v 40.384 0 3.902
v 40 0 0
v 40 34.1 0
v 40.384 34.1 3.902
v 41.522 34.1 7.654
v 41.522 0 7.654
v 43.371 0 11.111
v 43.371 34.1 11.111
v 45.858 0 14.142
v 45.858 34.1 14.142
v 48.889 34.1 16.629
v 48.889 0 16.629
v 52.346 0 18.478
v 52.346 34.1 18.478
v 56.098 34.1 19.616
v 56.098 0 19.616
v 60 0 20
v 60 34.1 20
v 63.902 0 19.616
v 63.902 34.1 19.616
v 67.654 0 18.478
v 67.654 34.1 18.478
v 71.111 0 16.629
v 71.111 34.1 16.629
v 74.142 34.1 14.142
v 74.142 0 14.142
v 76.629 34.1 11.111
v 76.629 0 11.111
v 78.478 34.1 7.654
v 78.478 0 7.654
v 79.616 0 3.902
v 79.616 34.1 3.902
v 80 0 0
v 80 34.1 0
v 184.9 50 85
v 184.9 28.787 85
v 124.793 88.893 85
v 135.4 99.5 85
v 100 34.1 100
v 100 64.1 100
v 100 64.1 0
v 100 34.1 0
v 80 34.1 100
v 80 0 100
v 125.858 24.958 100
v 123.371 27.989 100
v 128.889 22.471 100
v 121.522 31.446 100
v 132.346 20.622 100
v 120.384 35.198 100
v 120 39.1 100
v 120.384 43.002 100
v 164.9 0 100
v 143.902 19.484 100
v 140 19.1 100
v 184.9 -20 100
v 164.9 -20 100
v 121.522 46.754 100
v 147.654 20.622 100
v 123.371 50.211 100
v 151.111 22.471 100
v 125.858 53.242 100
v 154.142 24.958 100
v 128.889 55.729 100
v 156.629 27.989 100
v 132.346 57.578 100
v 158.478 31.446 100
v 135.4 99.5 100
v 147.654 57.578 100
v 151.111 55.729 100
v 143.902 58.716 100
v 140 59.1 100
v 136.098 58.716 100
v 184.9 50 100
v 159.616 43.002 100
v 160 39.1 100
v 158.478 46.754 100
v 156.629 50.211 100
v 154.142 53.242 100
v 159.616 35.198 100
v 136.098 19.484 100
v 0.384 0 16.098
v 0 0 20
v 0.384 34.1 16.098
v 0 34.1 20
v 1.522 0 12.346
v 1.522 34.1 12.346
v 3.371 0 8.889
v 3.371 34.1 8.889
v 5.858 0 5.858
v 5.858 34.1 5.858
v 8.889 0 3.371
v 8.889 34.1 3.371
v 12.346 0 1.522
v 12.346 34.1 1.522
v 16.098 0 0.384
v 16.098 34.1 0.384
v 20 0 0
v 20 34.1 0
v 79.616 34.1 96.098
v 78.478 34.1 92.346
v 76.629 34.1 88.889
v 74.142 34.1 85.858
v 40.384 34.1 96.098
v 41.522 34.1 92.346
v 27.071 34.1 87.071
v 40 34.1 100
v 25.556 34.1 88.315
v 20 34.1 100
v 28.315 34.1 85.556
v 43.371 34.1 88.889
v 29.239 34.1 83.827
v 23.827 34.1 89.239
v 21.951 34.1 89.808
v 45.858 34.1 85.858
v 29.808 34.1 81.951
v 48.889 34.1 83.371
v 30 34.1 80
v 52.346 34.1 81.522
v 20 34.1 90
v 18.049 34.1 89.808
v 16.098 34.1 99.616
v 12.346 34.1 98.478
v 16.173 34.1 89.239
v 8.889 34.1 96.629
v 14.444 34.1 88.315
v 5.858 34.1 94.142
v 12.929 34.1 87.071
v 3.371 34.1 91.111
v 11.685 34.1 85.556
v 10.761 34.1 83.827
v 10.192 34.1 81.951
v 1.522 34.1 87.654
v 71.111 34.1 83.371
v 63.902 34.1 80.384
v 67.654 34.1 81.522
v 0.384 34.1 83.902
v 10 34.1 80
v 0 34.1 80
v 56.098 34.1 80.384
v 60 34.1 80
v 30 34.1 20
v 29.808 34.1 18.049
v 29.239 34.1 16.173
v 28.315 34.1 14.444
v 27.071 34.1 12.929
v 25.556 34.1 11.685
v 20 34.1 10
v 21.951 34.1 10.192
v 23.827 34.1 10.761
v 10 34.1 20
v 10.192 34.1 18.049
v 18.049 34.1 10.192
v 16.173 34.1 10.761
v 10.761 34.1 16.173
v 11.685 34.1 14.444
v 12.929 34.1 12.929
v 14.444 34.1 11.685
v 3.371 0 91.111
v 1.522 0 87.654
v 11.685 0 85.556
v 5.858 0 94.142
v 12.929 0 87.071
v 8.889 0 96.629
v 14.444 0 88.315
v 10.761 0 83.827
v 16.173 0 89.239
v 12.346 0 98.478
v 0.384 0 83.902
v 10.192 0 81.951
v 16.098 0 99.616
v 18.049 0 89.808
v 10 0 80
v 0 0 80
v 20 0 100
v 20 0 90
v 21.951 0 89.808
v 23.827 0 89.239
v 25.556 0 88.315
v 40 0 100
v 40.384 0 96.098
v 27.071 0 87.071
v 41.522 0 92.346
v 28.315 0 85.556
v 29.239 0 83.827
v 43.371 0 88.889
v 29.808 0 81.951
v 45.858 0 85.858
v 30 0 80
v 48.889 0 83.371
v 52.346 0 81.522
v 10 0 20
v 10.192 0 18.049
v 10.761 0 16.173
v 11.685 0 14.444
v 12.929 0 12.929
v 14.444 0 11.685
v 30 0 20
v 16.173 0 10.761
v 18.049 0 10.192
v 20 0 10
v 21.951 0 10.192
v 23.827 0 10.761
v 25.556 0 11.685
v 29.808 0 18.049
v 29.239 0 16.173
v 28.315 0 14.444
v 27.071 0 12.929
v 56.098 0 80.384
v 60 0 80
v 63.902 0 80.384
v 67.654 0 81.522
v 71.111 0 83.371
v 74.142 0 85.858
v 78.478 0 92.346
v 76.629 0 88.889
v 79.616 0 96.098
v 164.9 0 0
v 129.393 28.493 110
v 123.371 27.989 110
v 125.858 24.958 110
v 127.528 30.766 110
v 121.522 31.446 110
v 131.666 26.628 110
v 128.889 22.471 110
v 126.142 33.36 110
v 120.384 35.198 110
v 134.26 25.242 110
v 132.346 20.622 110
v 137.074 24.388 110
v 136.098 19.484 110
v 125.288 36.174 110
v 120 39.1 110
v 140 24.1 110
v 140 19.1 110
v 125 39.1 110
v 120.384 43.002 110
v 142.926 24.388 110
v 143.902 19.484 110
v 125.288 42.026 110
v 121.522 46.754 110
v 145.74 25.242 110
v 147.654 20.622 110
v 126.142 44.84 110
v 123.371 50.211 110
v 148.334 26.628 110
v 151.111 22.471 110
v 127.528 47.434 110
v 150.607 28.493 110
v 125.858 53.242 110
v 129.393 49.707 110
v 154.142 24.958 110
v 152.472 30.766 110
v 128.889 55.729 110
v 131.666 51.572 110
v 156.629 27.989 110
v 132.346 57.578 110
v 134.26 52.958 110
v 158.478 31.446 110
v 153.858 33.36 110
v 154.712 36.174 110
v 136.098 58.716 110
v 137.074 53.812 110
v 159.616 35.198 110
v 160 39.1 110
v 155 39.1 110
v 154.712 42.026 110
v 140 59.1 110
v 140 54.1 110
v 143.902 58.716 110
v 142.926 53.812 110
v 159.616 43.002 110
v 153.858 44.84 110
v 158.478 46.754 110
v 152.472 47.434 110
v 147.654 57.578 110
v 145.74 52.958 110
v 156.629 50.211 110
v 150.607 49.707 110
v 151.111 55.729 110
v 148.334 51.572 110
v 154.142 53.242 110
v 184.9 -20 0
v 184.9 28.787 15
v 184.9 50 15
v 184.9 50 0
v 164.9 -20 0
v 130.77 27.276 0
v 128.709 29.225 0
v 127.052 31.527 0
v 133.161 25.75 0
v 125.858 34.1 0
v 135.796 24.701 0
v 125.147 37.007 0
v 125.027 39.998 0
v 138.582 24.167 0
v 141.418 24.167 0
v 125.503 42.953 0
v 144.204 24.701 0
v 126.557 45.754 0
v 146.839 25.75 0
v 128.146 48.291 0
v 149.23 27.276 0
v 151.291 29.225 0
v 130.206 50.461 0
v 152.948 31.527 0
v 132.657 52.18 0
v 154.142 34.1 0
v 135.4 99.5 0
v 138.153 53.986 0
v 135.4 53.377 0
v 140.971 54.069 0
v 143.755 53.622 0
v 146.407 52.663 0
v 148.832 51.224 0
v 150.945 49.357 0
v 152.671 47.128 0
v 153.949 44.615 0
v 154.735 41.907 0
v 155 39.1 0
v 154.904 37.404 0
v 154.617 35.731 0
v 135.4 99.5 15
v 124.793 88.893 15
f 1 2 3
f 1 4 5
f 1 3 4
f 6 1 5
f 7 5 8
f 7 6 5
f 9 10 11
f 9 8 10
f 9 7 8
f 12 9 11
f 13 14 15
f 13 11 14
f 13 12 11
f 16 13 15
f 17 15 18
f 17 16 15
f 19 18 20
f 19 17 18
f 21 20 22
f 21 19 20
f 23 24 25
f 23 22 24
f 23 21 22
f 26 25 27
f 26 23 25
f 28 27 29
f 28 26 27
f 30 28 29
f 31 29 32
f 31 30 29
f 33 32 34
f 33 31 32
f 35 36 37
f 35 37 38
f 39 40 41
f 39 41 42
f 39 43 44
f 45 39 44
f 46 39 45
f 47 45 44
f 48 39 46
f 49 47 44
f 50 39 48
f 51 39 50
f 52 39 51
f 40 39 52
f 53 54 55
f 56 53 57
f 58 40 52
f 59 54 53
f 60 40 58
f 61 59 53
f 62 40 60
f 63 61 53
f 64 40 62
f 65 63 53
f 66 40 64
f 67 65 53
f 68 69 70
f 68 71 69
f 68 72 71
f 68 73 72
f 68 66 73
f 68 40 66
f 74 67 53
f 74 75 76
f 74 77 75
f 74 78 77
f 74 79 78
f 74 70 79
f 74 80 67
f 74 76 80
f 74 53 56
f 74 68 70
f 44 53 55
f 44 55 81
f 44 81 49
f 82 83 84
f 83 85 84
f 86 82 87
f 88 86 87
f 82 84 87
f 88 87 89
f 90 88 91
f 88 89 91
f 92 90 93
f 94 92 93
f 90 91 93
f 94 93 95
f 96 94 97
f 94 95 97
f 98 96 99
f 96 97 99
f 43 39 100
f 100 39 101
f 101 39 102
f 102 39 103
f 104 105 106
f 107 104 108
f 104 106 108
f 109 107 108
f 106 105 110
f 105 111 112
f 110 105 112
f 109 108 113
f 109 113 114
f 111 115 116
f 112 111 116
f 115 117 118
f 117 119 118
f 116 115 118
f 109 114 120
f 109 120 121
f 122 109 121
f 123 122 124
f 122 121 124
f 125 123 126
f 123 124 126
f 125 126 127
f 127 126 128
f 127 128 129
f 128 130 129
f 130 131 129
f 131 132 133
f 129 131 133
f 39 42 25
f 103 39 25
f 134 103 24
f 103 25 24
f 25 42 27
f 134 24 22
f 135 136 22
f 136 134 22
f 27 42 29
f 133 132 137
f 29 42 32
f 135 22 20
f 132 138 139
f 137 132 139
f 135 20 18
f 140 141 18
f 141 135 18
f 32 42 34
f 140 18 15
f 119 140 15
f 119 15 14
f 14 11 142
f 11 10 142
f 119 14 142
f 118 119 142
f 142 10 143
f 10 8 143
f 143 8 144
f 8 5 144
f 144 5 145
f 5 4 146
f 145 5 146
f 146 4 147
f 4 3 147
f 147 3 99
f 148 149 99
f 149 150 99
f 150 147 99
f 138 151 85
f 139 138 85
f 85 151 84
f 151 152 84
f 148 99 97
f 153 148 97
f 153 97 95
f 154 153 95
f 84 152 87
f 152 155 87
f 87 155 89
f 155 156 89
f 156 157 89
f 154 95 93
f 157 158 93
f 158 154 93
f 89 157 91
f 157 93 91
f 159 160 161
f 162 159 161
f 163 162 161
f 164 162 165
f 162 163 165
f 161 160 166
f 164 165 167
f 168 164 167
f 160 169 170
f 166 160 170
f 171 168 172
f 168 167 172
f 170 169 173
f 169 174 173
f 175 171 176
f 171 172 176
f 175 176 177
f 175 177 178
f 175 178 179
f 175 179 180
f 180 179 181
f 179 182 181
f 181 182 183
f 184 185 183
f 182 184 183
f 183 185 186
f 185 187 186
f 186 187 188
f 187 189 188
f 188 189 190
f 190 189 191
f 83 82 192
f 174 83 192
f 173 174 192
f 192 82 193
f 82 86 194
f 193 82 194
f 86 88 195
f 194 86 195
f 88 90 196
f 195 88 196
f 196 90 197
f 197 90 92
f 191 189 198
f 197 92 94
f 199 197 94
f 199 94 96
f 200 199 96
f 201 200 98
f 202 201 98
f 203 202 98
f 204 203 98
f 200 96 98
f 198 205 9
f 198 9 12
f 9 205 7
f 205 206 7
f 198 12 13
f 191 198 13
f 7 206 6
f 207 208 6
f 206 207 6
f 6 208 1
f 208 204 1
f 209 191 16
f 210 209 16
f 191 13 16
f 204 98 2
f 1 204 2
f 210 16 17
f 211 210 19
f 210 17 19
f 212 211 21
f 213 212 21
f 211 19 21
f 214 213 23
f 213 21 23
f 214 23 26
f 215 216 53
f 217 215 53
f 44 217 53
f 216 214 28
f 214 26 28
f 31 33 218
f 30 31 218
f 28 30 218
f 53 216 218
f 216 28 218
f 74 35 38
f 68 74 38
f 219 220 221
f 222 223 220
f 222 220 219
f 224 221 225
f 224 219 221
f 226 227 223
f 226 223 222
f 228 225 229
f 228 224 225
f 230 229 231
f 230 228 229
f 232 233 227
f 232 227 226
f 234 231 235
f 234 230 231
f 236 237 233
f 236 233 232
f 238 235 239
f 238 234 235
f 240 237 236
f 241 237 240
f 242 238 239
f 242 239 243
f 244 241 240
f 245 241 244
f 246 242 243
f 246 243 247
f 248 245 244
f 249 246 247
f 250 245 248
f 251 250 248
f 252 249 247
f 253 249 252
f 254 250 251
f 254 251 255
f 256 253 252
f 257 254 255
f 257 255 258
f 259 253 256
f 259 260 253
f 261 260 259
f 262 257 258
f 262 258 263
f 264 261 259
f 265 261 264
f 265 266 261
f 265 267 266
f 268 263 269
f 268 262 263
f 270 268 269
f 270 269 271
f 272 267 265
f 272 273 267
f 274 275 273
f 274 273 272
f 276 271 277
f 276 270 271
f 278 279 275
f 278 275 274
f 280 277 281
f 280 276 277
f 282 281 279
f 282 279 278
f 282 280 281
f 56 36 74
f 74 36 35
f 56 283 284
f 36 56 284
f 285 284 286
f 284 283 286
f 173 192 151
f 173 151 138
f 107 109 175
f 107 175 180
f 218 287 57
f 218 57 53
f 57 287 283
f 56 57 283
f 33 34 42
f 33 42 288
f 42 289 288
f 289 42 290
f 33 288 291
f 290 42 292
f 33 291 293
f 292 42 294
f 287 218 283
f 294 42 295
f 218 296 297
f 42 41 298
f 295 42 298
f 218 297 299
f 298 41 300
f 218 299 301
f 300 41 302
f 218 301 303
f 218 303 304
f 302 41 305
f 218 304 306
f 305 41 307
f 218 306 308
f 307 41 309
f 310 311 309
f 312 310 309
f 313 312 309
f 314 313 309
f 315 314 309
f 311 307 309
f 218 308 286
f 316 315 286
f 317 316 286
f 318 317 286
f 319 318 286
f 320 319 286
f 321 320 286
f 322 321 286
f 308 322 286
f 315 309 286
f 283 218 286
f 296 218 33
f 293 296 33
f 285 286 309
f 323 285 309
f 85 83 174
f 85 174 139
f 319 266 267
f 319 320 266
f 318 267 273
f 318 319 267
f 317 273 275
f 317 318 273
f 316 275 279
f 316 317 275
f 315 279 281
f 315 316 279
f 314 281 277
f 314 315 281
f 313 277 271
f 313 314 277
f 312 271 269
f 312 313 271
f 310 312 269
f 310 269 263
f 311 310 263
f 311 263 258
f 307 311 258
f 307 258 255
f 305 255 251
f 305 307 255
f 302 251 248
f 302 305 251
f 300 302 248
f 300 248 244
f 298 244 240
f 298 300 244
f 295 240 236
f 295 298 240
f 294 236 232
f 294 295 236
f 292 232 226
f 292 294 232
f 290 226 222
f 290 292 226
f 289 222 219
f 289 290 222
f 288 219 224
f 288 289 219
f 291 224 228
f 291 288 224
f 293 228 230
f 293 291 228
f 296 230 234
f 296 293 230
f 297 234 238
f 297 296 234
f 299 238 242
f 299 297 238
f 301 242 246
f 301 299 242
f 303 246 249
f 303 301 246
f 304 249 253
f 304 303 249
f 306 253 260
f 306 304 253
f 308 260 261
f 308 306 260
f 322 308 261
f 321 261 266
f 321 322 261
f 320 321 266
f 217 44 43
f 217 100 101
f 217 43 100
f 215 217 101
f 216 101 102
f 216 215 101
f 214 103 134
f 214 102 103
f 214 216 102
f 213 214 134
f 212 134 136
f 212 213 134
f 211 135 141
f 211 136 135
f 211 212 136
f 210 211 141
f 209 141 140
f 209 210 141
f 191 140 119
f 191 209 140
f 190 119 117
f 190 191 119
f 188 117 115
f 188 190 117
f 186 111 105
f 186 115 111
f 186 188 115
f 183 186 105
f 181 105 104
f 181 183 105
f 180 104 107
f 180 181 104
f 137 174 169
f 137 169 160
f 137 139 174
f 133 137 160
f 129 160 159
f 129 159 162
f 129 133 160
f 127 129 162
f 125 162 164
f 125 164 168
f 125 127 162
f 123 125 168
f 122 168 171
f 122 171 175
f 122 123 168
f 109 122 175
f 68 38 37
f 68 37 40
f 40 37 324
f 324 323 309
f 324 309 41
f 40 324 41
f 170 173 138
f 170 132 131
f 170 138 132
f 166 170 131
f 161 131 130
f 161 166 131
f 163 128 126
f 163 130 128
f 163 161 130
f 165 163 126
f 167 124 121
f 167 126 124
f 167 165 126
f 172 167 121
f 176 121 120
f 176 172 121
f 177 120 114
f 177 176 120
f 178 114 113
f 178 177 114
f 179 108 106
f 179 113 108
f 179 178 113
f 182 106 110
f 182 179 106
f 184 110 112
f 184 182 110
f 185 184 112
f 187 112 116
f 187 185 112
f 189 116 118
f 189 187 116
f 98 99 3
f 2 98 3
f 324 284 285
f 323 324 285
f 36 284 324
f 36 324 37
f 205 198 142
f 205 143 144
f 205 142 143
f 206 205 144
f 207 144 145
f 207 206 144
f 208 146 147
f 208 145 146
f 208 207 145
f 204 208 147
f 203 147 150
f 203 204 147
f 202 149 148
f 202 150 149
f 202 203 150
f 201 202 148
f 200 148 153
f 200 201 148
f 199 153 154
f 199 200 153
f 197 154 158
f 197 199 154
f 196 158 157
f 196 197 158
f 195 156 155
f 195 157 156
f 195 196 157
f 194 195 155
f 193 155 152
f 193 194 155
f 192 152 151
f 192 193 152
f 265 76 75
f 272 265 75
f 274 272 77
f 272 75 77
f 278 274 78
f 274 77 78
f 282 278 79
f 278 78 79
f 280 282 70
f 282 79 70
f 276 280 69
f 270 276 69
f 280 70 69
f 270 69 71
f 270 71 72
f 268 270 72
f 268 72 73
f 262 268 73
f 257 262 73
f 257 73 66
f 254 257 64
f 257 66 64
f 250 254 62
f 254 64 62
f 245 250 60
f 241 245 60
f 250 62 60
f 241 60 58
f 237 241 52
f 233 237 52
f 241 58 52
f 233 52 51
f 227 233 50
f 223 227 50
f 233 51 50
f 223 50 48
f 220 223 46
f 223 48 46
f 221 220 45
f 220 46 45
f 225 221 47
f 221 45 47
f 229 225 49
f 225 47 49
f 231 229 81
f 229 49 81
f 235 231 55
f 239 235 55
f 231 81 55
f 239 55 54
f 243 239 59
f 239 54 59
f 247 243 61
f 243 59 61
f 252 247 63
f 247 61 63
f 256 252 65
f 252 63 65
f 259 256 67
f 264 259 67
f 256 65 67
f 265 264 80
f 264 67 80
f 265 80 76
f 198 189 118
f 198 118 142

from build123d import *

# Parameters (mm, degrees)
SKETCH_1_W               = 100
SKETCH_1_H               = 34.1
SKETCH_1_W_2             = 20
SKETCH_1_H_2             = 20
EXTRUDE_1_DEPTH          = 100
CUT_EXTRUDE_1_DEPTH      = 228.303332576
CUT_EXTRUDE_1_DEPTH_BACK = 228.303332576
SKETCH_2_W               = 70
SKETCH_2_H               = 15
CUT_EXTRUDE_2_DEPTH      = 221.148063812
CUT_EXTRUDE_2_DEPTH_BACK = 221.148063812
SKETCH_3_R               = 20
CUT_EXTRUDE_3_DEPTH      = 221.148063812
CUT_EXTRUDE_3_DEPTH_BACK = 221.148063812
SKETCH_4_R               = 10
FILLET_3_R               = 20
SKETCH_5_R               = 20
EXTRUDE_2_DEPTH          = 10
CUT_EXTRUDE_4_DEPTH      = 238.040629429
CUT_EXTRUDE_4_DEPTH_BACK = 238.040629429
SKETCH_6_R               = 15


with BuildPart() as part:
    # Эскиз1 → Бобышка-Вытянуть1 (new body)
    with BuildSketch(Plane.XY):
        with Locations((50, 17.05)):
            Rectangle(SKETCH_1_W, SKETCH_1_H)
        with BuildLine():
            Line((100, 34.1), (100, 0))
            Line((100, 0), (164.9, 0))
            Line((164.9, 0), (184.9, 0))
            Line((184.9, 0), (184.9, 34.1))
            Line((184.9, 34.1), (154.142135624, 34.1))
            ThreePointArc((154.142135624, 34.1), (140, 24.1), (125.857864376, 34.1))
            Line((125.857864376, 34.1), (100, 34.1))
        make_face()
        with BuildLine():
            Line((184.9, 50), (135.4, 99.5))
            Line((135.4, 99.5), (135.4, 53.377254638))
            ThreePointArc((135.4, 53.377254638), (148.831760866, 51.224355653), (155, 39.1))
            ThreePointArc((155, 39.1), (154.783978395, 36.563470319), (154.142135624, 34.1))
            Line((154.142135624, 34.1), (184.9, 34.1))
            Line((184.9, 34.1), (184.9, 50))
        make_face()
        with BuildLine():
            Line((100, 64.1), (100, 34.1))
            Line((100, 34.1), (125.857864376, 34.1))
            ThreePointArc((125.857864376, 34.1), (126.556784294, 45.754318257), (135.4, 53.377254638))
            Line((135.4, 53.377254638), (135.4, 99.5))
            Line((135.4, 99.5), (100, 64.1))
        make_face()
        with Locations((174.9, -10)):
            Rectangle(SKETCH_1_W_2, SKETCH_1_H_2)
    extrude(amount=EXTRUDE_1_DEPTH)

    # Эскиз2 → Вырез-Вытянуть1 (cut, two sides: drawn at the far end of the back side and taken through both)
    with BuildSketch(Plane(origin=(17.95, -17.95, 0), x_dir=(0, 0, 1), z_dir=(-0.7071067811865517, 0.7071067811865434, 0)).offset(-CUT_EXTRUDE_1_DEPTH_BACK)):
        with Locations((50, 158.599382901)):
            Rectangle(SKETCH_2_W, SKETCH_2_H)
    extrude(amount=CUT_EXTRUDE_1_DEPTH + CUT_EXTRUDE_1_DEPTH_BACK, mode=Mode.SUBTRACT)

    # Эскиз3 → Вырез-Вытянуть2 (cut, two sides: drawn at the far end of the back side and taken through both)
    with BuildSketch(Plane(origin=(0, 34.1, 0), x_dir=(1, 0, 0), z_dir=(0, 1, 0)).offset(-CUT_EXTRUDE_2_DEPTH_BACK)):
        with Locations((60, 0)):
            Circle(SKETCH_3_R)
        with Locations((60, -100)):
            Circle(SKETCH_3_R)
    extrude(amount=CUT_EXTRUDE_2_DEPTH + CUT_EXTRUDE_2_DEPTH_BACK, mode=Mode.SUBTRACT)

    # Эскиз4 → Вырез-Вытянуть3 (cut, two sides: drawn at the far end of the back side and taken through both)
    with BuildSketch(Plane(origin=(0, 34.1, 0), x_dir=(1, 0, 0), z_dir=(0, 1, 0)).offset(-CUT_EXTRUDE_3_DEPTH_BACK)):
        with BuildLine():
            Line((30, -80), (30, -20))
            ThreePointArc((30, -20), (20, -30), (10, -20))
            Line((10, -20), (10, -80))
            ThreePointArc((10, -80), (20, -70), (30, -80))
        make_face()
        with Locations((20, -20)):
            Circle(SKETCH_4_R)
        with Locations((20, -80)):
            Circle(SKETCH_4_R)
    extrude(amount=CUT_EXTRUDE_3_DEPTH + CUT_EXTRUDE_3_DEPTH_BACK, mode=Mode.SUBTRACT)

    # Скругление3
    fillet_3_edges = [part.edges().sort_by_distance(p)[0] for p in [
        (0, 17.05, 0),
        (0, 17.05, 100),
    ]]
    fillet(fillet_3_edges, radius=FILLET_3_R)

    # Эскиз5 → Бобышка-Вытянуть2 (add)
    with BuildSketch(Plane.XY.offset(100)):
        with Locations((140, 39.1)):
            Circle(SKETCH_5_R)
    extrude(amount=EXTRUDE_2_DEPTH)

    # Эскиз6 → Вырез-Вытянуть4 (cut, two sides: drawn at the far end of the back side and taken through both)
    with BuildSketch(Plane.XY.offset(110).offset(-CUT_EXTRUDE_4_DEPTH_BACK)):
        with Locations((140, 39.1)):
            Circle(SKETCH_6_R)
    extrude(amount=CUT_EXTRUDE_4_DEPTH + CUT_EXTRUDE_4_DEPTH_BACK, mode=Mode.SUBTRACT)


solid = part.part
